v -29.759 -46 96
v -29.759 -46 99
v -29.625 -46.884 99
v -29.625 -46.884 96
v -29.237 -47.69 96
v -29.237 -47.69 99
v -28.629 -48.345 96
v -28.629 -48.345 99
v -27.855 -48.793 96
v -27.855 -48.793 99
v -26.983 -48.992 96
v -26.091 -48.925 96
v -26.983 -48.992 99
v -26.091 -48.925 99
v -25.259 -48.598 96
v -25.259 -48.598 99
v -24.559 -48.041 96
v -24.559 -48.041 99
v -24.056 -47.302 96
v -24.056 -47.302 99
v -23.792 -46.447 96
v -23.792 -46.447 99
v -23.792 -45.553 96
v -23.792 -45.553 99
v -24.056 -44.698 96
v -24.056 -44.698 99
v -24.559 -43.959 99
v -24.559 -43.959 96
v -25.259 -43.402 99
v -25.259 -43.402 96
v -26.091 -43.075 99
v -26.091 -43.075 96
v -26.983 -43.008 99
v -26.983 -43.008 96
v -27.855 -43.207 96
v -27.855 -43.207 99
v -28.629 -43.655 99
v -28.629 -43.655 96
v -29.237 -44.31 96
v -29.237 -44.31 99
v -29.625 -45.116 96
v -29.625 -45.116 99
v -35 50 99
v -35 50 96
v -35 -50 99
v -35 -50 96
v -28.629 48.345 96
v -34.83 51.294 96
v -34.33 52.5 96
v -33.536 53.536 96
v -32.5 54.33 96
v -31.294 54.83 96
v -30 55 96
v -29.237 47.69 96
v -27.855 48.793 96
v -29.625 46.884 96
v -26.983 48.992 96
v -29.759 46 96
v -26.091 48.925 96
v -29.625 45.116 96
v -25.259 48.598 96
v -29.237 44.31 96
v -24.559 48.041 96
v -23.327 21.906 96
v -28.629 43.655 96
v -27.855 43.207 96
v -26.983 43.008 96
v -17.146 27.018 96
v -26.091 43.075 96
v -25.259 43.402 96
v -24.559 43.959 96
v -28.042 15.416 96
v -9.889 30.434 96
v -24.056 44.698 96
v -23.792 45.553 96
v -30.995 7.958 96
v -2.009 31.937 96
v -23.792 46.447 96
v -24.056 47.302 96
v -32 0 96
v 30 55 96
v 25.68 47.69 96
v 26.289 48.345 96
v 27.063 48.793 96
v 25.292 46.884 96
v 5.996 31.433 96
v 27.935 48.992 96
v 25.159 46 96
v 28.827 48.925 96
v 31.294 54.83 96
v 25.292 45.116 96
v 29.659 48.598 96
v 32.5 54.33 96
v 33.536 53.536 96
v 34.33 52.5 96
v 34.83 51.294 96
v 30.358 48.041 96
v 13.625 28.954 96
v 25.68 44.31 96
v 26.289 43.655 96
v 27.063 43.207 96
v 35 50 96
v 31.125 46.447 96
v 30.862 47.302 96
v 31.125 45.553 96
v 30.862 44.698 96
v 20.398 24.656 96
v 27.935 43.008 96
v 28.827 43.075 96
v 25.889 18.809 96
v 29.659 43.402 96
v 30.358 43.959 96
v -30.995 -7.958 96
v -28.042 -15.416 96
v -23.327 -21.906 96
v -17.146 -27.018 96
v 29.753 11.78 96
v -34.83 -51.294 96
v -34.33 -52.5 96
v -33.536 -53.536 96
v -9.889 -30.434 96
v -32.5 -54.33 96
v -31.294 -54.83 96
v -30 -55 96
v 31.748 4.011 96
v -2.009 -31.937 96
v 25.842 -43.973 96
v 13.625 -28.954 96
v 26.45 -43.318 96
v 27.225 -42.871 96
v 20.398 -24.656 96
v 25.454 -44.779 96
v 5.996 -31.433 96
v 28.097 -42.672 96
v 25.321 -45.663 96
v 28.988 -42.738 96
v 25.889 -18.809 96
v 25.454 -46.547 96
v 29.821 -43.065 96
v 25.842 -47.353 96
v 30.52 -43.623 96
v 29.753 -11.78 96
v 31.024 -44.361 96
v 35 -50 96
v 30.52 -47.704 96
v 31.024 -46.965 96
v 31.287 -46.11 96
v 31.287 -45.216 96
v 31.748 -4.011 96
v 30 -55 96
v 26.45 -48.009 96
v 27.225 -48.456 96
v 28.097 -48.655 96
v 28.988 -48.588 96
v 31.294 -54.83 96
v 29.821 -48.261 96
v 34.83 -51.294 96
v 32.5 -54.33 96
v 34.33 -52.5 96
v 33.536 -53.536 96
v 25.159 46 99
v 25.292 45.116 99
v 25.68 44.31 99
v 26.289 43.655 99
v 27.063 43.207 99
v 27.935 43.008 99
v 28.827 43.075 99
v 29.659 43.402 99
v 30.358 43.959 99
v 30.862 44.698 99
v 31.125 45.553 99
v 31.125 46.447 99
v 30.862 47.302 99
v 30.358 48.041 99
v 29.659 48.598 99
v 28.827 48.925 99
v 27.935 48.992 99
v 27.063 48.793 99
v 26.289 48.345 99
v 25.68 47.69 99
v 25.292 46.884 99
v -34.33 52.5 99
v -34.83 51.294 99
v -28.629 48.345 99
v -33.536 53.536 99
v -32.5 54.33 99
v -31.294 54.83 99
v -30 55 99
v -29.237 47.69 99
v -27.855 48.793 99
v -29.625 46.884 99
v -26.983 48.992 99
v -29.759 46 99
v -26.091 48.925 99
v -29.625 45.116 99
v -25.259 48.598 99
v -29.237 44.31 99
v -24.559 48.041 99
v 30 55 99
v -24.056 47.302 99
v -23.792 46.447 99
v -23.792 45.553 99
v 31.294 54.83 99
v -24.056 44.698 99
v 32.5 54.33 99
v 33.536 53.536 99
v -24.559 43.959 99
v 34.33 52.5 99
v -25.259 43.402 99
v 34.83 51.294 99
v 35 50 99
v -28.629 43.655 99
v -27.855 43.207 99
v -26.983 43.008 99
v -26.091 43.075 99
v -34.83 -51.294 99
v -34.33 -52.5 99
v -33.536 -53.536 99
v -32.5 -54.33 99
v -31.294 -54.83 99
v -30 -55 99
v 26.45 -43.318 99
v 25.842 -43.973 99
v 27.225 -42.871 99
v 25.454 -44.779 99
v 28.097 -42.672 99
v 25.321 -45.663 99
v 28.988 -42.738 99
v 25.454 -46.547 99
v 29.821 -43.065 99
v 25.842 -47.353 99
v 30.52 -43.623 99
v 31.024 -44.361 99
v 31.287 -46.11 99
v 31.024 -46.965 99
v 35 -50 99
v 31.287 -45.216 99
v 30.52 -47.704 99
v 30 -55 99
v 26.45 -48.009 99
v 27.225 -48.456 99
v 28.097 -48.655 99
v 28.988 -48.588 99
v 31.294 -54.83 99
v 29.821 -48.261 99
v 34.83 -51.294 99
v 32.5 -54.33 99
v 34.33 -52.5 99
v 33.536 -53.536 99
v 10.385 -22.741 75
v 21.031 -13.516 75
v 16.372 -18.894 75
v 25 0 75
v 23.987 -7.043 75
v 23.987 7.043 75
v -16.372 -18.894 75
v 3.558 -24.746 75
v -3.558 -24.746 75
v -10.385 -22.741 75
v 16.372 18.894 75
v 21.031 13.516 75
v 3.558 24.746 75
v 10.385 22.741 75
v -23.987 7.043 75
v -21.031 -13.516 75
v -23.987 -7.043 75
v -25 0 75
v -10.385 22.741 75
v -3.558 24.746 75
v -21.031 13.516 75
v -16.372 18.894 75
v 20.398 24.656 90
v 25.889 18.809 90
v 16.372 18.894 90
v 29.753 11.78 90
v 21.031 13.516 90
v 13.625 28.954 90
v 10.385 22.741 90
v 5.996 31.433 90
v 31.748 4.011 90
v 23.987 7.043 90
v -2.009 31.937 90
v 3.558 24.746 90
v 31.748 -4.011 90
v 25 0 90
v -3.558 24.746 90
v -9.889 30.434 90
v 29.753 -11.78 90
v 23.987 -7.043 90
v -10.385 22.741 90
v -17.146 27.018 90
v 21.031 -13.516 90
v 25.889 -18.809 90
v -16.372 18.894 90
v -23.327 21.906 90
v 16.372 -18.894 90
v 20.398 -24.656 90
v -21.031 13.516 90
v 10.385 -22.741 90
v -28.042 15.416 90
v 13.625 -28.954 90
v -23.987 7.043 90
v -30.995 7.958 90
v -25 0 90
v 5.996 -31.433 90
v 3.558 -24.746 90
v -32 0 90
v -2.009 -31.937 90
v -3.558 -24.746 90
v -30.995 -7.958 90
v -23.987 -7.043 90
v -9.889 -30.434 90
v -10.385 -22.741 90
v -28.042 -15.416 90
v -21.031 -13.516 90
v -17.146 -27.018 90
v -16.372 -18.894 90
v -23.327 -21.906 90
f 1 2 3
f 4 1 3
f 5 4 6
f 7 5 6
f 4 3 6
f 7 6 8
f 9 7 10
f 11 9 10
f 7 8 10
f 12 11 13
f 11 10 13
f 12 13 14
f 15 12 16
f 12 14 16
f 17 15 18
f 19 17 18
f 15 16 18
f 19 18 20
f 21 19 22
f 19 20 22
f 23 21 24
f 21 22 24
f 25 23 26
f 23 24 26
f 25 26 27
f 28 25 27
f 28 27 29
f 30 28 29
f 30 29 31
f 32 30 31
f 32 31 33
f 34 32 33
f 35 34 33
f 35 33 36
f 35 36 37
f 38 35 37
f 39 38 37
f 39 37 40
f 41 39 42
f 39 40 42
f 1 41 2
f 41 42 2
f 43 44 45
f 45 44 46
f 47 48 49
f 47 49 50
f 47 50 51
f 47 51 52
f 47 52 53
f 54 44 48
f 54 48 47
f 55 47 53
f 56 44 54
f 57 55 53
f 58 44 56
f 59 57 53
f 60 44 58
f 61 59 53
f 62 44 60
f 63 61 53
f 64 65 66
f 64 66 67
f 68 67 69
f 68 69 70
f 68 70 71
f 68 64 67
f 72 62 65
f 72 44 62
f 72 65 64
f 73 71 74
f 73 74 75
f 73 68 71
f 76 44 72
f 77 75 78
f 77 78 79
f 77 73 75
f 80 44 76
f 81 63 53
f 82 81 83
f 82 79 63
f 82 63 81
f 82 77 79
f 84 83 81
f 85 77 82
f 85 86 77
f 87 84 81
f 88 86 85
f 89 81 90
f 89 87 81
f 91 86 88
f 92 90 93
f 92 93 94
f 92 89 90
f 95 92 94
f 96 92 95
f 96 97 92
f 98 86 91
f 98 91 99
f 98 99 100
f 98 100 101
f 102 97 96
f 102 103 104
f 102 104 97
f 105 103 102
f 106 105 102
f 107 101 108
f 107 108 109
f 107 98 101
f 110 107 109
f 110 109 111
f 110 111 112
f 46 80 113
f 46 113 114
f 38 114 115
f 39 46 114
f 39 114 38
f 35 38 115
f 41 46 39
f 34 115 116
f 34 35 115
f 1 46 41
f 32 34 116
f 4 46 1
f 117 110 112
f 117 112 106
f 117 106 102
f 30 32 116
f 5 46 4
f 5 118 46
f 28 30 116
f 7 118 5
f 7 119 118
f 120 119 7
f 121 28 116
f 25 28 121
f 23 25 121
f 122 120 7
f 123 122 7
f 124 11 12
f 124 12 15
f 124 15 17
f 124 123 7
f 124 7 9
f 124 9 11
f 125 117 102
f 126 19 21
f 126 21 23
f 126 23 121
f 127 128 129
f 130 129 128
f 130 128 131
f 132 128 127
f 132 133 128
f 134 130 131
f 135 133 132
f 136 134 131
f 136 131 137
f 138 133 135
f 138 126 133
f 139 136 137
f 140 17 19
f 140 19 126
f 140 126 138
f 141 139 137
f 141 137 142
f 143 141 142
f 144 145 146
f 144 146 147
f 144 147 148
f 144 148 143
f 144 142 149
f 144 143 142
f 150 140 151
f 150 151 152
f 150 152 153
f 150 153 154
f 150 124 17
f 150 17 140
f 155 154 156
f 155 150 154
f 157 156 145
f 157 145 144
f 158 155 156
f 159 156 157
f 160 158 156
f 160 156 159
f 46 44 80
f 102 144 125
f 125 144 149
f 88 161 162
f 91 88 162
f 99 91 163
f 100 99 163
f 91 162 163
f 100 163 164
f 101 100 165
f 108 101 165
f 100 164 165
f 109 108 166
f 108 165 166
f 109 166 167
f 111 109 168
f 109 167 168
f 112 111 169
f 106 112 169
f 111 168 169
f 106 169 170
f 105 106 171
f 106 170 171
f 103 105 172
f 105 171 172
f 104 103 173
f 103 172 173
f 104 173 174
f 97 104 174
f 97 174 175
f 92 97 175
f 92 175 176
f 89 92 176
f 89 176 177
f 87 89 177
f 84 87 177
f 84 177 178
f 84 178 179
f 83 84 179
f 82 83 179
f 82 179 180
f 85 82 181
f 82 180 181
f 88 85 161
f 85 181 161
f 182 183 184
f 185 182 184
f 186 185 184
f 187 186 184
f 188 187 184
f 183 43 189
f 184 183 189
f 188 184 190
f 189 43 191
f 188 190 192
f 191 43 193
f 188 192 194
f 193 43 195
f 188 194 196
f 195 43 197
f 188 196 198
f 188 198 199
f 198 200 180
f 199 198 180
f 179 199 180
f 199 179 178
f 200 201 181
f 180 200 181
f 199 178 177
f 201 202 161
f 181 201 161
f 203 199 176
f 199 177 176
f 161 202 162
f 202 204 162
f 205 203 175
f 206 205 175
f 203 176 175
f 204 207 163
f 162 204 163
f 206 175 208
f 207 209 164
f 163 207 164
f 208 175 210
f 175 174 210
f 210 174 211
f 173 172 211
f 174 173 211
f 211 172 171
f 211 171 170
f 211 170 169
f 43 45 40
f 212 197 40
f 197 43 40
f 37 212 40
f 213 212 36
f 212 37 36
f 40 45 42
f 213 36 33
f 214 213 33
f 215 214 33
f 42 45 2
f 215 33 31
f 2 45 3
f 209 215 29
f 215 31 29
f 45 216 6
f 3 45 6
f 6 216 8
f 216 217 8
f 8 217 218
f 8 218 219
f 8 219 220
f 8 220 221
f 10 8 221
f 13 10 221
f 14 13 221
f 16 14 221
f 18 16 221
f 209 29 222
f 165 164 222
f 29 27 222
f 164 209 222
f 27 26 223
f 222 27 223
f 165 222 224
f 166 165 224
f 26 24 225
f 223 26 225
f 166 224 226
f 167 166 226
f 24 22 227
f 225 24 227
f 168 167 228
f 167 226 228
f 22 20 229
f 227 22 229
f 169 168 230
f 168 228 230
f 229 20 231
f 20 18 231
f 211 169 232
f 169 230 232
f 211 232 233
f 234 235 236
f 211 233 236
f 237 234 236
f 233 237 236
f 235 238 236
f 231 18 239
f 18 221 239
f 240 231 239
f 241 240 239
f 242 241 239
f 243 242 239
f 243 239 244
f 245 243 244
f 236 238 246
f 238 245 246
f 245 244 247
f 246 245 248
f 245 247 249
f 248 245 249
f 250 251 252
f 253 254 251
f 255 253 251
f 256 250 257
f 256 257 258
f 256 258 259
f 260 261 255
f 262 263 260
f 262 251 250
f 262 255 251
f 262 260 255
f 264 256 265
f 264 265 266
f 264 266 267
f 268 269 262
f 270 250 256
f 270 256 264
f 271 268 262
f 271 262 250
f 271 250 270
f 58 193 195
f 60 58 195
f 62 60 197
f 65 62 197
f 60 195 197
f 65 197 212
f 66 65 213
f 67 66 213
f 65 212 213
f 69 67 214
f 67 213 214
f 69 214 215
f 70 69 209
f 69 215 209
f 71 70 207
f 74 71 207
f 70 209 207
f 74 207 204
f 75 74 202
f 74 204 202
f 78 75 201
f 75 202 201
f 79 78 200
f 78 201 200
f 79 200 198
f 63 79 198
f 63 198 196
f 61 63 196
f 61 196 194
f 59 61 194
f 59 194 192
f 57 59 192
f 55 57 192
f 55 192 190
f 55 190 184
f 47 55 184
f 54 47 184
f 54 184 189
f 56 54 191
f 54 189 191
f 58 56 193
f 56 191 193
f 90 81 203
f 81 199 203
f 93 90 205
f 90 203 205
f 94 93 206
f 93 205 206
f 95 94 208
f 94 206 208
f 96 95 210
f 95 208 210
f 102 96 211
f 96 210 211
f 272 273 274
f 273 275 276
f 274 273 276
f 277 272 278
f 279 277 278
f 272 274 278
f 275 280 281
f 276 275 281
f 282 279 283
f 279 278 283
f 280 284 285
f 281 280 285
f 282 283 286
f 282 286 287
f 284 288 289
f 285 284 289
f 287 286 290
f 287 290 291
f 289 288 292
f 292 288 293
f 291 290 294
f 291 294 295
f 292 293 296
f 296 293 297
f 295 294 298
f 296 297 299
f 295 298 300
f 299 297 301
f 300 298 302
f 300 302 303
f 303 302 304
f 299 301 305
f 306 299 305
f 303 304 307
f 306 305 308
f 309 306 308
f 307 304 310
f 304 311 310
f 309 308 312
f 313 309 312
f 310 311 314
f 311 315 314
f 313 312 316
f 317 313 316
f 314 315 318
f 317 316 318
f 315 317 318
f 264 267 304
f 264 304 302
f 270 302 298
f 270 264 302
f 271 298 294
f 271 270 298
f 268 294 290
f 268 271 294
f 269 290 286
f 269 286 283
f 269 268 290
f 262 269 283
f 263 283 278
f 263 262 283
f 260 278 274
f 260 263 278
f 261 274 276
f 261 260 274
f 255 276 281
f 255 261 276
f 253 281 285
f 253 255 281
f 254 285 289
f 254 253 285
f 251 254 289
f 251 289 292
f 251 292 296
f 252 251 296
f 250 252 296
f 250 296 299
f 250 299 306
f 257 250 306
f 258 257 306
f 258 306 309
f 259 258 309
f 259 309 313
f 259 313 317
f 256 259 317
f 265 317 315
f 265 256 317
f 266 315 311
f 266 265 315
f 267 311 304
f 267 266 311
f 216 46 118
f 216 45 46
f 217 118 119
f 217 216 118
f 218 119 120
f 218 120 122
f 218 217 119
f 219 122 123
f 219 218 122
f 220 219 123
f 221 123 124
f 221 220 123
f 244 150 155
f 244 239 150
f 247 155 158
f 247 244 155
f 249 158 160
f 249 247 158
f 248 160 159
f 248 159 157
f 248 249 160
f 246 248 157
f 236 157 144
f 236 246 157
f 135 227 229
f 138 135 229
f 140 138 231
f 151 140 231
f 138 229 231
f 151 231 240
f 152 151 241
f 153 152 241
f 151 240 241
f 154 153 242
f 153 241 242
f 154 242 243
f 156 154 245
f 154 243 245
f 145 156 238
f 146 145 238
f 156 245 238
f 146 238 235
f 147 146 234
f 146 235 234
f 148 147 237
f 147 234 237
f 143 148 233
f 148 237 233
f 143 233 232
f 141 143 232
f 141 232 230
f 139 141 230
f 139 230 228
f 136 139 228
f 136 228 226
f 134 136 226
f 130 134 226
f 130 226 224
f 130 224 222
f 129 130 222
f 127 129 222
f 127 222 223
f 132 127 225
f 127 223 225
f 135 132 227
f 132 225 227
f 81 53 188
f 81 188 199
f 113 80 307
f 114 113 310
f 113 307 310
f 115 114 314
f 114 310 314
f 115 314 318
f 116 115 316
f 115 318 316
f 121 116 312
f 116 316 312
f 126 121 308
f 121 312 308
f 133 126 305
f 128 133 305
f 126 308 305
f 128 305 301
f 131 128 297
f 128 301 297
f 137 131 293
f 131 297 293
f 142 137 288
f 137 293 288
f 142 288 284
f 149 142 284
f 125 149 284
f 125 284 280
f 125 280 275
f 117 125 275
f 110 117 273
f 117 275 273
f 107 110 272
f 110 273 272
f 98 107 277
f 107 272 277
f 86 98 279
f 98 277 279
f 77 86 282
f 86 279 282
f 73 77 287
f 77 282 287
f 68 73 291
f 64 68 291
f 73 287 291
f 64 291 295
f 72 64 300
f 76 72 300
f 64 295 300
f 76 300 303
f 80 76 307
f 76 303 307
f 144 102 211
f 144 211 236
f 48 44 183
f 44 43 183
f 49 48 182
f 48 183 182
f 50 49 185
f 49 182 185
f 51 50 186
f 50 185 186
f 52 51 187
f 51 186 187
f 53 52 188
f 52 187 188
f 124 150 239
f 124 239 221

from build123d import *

# Parameters (mm, degrees)
SKETCH3_R             = 25
BOSS_EXTRUDE1_DEPTH   = 15
SKETCH4_R             = 32
BOSS_EXTRUDE2_DEPTH   = 6
BOSS_EXTRUDE3_DEPTH   = 3
FILLET1_R             = 5
FILLET2_R             = 5
SKETCH8_R             = 3
CUT_EXTRUDE1_DEPTH    = 3
BODY_MOVE_COPY1_ANGLE = 120
BODY_MOVE_COPY4_ANGLE = 90


with BuildPart() as part:
    # Sketch3 → Boss-Extrude1 (new body)
    with BuildSketch(Plane(origin=(0, 0, 0), x_dir=(1, 0, 0), z_dir=(0, 1, 0))):
        Circle(SKETCH3_R)
    extrude(amount=-BOSS_EXTRUDE1_DEPTH)

    # Sketch4 → Boss-Extrude2 (add)
    with BuildSketch(Plane.XZ.offset(15)):
        Circle(SKETCH4_R)
    extrude(amount=BOSS_EXTRUDE2_DEPTH)

    # Sketch6 → Boss-Extrude3 (add)
    with BuildSketch(Plane.XZ.offset(21)):
        Polygon((35, 0), (35, -55), (-35, -55), (-35, 55), (35, 55), align=None)
    extrude(amount=BOSS_EXTRUDE3_DEPTH)

    # Fillet1
    fillet1_edges = [part.edges().sort_by_distance(p)[0] for p in [
        (35, -22.5, 55),
    ]]
    fillet(fillet1_edges, radius=FILLET1_R)

    # Fillet2
    fillet2_edges = [part.edges().sort_by_distance(p)[0] for p in [
        (-35, -22.5, 55),
        (-35, -22.5, -55),
        (35, -22.5, -55),
    ]]
    fillet(fillet2_edges, radius=FILLET2_R)

    # Sketch8 → Cut-Extrude1 (cut)
    with BuildSketch(Plane.XZ.offset(24)):
        with Locations((26.758523595, -46)):
            Circle(SKETCH8_R)
        with Locations((-28.158970904, -46)):
            Circle(SKETCH8_R)
        with Locations((26.758523595, 46)):
            Circle(SKETCH8_R)
        with Locations((-28.320886722, 45.663145403)):
            Circle(SKETCH8_R)
    extrude(amount=-CUT_EXTRUDE1_DEPTH, mode=Mode.SUBTRACT)


with BuildPart() as part_1:
    # Body-Move/Copy1: moved
    add(part.part.rotate(Axis((0, 0, 0), (-0.5773502691896252, -0.5773502691896272, 0.5773502691896252)), BODY_MOVE_COPY1_ANGLE))


with BuildPart() as part_2:
    # Body-Move/Copy2: moved
    add(part_1.part.moved(Location((0, 0, -24))))


with BuildPart() as part_3:
    # Body-Move/Copy3: moved
    add(part_2.part.moved(Location((0, 0, 99))))


with BuildPart() as part_4:
    # Body-Move/Copy4: moved
    add(part_3.part.rotate(Axis((0, 0, 0), (0, 0, 1)), BODY_MOVE_COPY4_ANGLE))


solid = part_4.part
